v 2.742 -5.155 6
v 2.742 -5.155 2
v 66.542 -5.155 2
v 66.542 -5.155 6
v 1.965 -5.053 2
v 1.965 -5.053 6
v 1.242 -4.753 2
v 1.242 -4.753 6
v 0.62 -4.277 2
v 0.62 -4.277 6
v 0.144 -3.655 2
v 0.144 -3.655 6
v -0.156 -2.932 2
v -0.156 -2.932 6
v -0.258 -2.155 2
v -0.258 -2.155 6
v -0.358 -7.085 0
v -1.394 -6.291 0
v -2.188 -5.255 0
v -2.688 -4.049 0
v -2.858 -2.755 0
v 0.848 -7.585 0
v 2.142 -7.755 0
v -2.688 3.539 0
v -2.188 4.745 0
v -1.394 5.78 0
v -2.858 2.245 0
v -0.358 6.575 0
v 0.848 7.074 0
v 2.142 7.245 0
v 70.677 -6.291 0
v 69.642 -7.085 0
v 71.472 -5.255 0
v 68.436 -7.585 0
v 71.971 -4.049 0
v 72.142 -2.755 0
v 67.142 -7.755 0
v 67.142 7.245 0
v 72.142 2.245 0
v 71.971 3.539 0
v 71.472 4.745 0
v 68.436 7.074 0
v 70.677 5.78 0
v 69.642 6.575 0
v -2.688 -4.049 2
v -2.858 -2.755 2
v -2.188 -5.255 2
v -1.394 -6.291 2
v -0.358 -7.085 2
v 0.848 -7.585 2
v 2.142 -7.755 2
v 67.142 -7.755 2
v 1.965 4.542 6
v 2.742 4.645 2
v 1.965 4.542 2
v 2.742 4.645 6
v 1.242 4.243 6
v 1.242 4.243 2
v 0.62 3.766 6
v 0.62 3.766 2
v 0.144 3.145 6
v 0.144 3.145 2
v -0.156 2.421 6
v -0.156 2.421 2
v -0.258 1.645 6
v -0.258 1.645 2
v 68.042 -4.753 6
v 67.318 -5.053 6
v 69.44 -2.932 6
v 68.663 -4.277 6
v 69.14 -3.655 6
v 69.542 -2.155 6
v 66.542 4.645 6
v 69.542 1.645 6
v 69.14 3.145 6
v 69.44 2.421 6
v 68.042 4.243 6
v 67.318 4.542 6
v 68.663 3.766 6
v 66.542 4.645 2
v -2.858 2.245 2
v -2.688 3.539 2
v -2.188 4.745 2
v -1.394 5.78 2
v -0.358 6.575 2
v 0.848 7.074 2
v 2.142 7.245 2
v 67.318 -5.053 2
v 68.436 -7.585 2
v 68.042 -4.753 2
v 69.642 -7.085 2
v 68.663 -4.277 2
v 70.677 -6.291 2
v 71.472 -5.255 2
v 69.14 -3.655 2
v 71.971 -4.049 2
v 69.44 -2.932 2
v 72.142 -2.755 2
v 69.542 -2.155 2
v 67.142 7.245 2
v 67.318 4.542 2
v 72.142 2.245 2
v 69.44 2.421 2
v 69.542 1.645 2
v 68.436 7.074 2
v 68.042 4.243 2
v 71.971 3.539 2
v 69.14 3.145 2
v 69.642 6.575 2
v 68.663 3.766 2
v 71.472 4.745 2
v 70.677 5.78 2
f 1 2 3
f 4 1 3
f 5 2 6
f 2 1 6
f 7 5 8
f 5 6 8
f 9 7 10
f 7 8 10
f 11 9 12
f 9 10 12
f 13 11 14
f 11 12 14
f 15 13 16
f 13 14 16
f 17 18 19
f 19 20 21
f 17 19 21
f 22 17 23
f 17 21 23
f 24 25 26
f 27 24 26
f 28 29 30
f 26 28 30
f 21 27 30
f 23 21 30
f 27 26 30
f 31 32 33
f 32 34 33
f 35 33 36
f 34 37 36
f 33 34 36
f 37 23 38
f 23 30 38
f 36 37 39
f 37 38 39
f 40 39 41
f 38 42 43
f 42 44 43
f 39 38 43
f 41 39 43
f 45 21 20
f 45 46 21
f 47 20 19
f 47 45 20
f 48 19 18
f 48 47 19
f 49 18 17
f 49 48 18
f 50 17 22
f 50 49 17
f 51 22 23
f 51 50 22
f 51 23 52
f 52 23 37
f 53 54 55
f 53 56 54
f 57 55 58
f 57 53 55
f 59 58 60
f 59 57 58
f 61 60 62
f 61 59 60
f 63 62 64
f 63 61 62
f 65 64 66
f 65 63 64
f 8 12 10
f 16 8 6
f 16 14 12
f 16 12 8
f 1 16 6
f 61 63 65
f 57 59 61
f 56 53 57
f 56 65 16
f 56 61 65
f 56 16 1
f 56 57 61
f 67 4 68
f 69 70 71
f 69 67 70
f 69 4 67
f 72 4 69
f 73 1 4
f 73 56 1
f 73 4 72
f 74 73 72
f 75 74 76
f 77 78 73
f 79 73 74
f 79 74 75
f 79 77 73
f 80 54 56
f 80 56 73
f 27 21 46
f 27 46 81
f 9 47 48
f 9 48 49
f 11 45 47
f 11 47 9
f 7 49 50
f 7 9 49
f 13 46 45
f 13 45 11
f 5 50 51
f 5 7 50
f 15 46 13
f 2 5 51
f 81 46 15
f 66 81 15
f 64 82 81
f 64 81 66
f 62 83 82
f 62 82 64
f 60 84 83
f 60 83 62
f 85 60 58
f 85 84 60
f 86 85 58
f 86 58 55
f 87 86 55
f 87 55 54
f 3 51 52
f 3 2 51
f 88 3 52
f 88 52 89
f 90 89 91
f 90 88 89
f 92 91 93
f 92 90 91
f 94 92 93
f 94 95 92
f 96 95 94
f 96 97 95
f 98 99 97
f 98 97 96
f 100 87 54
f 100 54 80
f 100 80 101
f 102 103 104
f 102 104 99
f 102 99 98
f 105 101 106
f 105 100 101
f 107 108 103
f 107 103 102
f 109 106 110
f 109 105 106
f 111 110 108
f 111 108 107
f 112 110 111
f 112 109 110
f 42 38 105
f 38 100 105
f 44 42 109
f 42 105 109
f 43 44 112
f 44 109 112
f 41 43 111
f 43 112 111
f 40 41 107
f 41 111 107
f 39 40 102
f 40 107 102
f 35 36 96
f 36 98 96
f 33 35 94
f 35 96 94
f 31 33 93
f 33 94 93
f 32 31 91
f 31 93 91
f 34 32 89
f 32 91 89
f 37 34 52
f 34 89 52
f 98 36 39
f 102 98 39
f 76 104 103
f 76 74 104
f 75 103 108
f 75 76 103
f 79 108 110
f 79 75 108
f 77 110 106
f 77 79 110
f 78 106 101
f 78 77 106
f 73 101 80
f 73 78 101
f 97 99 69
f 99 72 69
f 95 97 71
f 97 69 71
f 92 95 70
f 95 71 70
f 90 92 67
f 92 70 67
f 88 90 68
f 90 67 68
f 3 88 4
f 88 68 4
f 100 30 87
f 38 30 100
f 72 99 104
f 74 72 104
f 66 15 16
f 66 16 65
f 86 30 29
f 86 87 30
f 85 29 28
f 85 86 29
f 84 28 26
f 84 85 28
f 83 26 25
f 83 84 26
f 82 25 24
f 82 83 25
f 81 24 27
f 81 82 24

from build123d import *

# Parameters (mm, degrees)
F0_W     = 75
F0_H     = 15
F1_DEPTH = 2
F2_W     = 69.8
F2_H     = 9.8
F3_DEPTH = 4
F4_R     = 5
F5_R     = 3
F6_R     = 5
F7_R     = 5
F8_R     = 3
F9_R     = 3
F10_R    = 5
F11_R    = 3


with BuildPart() as f1:
    # F0 (on Top) → F1 (new body)
    with BuildSketch(Plane.XY):
        with Locations((34.641778, -0.255361)):
            Rectangle(F0_W, F0_H)
    extrude(amount=F1_DEPTH)

    # F2 (on face) → F3 (join)
    with BuildSketch(Plane.XY.offset(2)):
        with Locations((34.641778, -0.255361)):
            Rectangle(F2_W, F2_H)
    extrude(amount=F3_DEPTH)

    # F4
    f4_edges = [f1.edges().sort_by_distance(p)[0] for p in [
        (-2.858222, -7.755361, 1),
    ]]
    fillet(f4_edges, radius=F4_R)

    # F5
    f5_edges = [f1.edges().sort_by_distance(p)[0] for p in [
        (-0.258222, -5.155361, 4),
    ]]
    fillet(f5_edges, radius=F5_R)

    # F6
    f6_edges = [f1.edges().sort_by_distance(p)[0] for p in [
        (72.141778, 7.244639, 1),
    ]]
    fillet(f6_edges, radius=F6_R)

    # F7
    f7_edges = [f1.edges().sort_by_distance(p)[0] for p in [
        (72.141778, -7.755361, 1),
    ]]
    fillet(f7_edges, radius=F7_R)

    # F8
    f8_edges = [f1.edges().sort_by_distance(p)[0] for p in [
        (69.541778, 4.644639, 4),
    ]]
    fillet(f8_edges, radius=F8_R)

    # F9
    f9_edges = [f1.edges().sort_by_distance(p)[0] for p in [
        (69.541778, -5.155361, 4),
    ]]
    fillet(f9_edges, radius=F9_R)

    # F10
    f10_edges = [f1.edges().sort_by_distance(p)[0] for p in [
        (-2.858222, 7.244639, 1),
    ]]
    fillet(f10_edges, radius=F10_R)

    # F11
    f11_edges = [f1.edges().sort_by_distance(p)[0] for p in [
        (-0.258222, 4.644639, 4),
    ]]
    fillet(f11_edges, radius=F11_R)


solid = f1.part
